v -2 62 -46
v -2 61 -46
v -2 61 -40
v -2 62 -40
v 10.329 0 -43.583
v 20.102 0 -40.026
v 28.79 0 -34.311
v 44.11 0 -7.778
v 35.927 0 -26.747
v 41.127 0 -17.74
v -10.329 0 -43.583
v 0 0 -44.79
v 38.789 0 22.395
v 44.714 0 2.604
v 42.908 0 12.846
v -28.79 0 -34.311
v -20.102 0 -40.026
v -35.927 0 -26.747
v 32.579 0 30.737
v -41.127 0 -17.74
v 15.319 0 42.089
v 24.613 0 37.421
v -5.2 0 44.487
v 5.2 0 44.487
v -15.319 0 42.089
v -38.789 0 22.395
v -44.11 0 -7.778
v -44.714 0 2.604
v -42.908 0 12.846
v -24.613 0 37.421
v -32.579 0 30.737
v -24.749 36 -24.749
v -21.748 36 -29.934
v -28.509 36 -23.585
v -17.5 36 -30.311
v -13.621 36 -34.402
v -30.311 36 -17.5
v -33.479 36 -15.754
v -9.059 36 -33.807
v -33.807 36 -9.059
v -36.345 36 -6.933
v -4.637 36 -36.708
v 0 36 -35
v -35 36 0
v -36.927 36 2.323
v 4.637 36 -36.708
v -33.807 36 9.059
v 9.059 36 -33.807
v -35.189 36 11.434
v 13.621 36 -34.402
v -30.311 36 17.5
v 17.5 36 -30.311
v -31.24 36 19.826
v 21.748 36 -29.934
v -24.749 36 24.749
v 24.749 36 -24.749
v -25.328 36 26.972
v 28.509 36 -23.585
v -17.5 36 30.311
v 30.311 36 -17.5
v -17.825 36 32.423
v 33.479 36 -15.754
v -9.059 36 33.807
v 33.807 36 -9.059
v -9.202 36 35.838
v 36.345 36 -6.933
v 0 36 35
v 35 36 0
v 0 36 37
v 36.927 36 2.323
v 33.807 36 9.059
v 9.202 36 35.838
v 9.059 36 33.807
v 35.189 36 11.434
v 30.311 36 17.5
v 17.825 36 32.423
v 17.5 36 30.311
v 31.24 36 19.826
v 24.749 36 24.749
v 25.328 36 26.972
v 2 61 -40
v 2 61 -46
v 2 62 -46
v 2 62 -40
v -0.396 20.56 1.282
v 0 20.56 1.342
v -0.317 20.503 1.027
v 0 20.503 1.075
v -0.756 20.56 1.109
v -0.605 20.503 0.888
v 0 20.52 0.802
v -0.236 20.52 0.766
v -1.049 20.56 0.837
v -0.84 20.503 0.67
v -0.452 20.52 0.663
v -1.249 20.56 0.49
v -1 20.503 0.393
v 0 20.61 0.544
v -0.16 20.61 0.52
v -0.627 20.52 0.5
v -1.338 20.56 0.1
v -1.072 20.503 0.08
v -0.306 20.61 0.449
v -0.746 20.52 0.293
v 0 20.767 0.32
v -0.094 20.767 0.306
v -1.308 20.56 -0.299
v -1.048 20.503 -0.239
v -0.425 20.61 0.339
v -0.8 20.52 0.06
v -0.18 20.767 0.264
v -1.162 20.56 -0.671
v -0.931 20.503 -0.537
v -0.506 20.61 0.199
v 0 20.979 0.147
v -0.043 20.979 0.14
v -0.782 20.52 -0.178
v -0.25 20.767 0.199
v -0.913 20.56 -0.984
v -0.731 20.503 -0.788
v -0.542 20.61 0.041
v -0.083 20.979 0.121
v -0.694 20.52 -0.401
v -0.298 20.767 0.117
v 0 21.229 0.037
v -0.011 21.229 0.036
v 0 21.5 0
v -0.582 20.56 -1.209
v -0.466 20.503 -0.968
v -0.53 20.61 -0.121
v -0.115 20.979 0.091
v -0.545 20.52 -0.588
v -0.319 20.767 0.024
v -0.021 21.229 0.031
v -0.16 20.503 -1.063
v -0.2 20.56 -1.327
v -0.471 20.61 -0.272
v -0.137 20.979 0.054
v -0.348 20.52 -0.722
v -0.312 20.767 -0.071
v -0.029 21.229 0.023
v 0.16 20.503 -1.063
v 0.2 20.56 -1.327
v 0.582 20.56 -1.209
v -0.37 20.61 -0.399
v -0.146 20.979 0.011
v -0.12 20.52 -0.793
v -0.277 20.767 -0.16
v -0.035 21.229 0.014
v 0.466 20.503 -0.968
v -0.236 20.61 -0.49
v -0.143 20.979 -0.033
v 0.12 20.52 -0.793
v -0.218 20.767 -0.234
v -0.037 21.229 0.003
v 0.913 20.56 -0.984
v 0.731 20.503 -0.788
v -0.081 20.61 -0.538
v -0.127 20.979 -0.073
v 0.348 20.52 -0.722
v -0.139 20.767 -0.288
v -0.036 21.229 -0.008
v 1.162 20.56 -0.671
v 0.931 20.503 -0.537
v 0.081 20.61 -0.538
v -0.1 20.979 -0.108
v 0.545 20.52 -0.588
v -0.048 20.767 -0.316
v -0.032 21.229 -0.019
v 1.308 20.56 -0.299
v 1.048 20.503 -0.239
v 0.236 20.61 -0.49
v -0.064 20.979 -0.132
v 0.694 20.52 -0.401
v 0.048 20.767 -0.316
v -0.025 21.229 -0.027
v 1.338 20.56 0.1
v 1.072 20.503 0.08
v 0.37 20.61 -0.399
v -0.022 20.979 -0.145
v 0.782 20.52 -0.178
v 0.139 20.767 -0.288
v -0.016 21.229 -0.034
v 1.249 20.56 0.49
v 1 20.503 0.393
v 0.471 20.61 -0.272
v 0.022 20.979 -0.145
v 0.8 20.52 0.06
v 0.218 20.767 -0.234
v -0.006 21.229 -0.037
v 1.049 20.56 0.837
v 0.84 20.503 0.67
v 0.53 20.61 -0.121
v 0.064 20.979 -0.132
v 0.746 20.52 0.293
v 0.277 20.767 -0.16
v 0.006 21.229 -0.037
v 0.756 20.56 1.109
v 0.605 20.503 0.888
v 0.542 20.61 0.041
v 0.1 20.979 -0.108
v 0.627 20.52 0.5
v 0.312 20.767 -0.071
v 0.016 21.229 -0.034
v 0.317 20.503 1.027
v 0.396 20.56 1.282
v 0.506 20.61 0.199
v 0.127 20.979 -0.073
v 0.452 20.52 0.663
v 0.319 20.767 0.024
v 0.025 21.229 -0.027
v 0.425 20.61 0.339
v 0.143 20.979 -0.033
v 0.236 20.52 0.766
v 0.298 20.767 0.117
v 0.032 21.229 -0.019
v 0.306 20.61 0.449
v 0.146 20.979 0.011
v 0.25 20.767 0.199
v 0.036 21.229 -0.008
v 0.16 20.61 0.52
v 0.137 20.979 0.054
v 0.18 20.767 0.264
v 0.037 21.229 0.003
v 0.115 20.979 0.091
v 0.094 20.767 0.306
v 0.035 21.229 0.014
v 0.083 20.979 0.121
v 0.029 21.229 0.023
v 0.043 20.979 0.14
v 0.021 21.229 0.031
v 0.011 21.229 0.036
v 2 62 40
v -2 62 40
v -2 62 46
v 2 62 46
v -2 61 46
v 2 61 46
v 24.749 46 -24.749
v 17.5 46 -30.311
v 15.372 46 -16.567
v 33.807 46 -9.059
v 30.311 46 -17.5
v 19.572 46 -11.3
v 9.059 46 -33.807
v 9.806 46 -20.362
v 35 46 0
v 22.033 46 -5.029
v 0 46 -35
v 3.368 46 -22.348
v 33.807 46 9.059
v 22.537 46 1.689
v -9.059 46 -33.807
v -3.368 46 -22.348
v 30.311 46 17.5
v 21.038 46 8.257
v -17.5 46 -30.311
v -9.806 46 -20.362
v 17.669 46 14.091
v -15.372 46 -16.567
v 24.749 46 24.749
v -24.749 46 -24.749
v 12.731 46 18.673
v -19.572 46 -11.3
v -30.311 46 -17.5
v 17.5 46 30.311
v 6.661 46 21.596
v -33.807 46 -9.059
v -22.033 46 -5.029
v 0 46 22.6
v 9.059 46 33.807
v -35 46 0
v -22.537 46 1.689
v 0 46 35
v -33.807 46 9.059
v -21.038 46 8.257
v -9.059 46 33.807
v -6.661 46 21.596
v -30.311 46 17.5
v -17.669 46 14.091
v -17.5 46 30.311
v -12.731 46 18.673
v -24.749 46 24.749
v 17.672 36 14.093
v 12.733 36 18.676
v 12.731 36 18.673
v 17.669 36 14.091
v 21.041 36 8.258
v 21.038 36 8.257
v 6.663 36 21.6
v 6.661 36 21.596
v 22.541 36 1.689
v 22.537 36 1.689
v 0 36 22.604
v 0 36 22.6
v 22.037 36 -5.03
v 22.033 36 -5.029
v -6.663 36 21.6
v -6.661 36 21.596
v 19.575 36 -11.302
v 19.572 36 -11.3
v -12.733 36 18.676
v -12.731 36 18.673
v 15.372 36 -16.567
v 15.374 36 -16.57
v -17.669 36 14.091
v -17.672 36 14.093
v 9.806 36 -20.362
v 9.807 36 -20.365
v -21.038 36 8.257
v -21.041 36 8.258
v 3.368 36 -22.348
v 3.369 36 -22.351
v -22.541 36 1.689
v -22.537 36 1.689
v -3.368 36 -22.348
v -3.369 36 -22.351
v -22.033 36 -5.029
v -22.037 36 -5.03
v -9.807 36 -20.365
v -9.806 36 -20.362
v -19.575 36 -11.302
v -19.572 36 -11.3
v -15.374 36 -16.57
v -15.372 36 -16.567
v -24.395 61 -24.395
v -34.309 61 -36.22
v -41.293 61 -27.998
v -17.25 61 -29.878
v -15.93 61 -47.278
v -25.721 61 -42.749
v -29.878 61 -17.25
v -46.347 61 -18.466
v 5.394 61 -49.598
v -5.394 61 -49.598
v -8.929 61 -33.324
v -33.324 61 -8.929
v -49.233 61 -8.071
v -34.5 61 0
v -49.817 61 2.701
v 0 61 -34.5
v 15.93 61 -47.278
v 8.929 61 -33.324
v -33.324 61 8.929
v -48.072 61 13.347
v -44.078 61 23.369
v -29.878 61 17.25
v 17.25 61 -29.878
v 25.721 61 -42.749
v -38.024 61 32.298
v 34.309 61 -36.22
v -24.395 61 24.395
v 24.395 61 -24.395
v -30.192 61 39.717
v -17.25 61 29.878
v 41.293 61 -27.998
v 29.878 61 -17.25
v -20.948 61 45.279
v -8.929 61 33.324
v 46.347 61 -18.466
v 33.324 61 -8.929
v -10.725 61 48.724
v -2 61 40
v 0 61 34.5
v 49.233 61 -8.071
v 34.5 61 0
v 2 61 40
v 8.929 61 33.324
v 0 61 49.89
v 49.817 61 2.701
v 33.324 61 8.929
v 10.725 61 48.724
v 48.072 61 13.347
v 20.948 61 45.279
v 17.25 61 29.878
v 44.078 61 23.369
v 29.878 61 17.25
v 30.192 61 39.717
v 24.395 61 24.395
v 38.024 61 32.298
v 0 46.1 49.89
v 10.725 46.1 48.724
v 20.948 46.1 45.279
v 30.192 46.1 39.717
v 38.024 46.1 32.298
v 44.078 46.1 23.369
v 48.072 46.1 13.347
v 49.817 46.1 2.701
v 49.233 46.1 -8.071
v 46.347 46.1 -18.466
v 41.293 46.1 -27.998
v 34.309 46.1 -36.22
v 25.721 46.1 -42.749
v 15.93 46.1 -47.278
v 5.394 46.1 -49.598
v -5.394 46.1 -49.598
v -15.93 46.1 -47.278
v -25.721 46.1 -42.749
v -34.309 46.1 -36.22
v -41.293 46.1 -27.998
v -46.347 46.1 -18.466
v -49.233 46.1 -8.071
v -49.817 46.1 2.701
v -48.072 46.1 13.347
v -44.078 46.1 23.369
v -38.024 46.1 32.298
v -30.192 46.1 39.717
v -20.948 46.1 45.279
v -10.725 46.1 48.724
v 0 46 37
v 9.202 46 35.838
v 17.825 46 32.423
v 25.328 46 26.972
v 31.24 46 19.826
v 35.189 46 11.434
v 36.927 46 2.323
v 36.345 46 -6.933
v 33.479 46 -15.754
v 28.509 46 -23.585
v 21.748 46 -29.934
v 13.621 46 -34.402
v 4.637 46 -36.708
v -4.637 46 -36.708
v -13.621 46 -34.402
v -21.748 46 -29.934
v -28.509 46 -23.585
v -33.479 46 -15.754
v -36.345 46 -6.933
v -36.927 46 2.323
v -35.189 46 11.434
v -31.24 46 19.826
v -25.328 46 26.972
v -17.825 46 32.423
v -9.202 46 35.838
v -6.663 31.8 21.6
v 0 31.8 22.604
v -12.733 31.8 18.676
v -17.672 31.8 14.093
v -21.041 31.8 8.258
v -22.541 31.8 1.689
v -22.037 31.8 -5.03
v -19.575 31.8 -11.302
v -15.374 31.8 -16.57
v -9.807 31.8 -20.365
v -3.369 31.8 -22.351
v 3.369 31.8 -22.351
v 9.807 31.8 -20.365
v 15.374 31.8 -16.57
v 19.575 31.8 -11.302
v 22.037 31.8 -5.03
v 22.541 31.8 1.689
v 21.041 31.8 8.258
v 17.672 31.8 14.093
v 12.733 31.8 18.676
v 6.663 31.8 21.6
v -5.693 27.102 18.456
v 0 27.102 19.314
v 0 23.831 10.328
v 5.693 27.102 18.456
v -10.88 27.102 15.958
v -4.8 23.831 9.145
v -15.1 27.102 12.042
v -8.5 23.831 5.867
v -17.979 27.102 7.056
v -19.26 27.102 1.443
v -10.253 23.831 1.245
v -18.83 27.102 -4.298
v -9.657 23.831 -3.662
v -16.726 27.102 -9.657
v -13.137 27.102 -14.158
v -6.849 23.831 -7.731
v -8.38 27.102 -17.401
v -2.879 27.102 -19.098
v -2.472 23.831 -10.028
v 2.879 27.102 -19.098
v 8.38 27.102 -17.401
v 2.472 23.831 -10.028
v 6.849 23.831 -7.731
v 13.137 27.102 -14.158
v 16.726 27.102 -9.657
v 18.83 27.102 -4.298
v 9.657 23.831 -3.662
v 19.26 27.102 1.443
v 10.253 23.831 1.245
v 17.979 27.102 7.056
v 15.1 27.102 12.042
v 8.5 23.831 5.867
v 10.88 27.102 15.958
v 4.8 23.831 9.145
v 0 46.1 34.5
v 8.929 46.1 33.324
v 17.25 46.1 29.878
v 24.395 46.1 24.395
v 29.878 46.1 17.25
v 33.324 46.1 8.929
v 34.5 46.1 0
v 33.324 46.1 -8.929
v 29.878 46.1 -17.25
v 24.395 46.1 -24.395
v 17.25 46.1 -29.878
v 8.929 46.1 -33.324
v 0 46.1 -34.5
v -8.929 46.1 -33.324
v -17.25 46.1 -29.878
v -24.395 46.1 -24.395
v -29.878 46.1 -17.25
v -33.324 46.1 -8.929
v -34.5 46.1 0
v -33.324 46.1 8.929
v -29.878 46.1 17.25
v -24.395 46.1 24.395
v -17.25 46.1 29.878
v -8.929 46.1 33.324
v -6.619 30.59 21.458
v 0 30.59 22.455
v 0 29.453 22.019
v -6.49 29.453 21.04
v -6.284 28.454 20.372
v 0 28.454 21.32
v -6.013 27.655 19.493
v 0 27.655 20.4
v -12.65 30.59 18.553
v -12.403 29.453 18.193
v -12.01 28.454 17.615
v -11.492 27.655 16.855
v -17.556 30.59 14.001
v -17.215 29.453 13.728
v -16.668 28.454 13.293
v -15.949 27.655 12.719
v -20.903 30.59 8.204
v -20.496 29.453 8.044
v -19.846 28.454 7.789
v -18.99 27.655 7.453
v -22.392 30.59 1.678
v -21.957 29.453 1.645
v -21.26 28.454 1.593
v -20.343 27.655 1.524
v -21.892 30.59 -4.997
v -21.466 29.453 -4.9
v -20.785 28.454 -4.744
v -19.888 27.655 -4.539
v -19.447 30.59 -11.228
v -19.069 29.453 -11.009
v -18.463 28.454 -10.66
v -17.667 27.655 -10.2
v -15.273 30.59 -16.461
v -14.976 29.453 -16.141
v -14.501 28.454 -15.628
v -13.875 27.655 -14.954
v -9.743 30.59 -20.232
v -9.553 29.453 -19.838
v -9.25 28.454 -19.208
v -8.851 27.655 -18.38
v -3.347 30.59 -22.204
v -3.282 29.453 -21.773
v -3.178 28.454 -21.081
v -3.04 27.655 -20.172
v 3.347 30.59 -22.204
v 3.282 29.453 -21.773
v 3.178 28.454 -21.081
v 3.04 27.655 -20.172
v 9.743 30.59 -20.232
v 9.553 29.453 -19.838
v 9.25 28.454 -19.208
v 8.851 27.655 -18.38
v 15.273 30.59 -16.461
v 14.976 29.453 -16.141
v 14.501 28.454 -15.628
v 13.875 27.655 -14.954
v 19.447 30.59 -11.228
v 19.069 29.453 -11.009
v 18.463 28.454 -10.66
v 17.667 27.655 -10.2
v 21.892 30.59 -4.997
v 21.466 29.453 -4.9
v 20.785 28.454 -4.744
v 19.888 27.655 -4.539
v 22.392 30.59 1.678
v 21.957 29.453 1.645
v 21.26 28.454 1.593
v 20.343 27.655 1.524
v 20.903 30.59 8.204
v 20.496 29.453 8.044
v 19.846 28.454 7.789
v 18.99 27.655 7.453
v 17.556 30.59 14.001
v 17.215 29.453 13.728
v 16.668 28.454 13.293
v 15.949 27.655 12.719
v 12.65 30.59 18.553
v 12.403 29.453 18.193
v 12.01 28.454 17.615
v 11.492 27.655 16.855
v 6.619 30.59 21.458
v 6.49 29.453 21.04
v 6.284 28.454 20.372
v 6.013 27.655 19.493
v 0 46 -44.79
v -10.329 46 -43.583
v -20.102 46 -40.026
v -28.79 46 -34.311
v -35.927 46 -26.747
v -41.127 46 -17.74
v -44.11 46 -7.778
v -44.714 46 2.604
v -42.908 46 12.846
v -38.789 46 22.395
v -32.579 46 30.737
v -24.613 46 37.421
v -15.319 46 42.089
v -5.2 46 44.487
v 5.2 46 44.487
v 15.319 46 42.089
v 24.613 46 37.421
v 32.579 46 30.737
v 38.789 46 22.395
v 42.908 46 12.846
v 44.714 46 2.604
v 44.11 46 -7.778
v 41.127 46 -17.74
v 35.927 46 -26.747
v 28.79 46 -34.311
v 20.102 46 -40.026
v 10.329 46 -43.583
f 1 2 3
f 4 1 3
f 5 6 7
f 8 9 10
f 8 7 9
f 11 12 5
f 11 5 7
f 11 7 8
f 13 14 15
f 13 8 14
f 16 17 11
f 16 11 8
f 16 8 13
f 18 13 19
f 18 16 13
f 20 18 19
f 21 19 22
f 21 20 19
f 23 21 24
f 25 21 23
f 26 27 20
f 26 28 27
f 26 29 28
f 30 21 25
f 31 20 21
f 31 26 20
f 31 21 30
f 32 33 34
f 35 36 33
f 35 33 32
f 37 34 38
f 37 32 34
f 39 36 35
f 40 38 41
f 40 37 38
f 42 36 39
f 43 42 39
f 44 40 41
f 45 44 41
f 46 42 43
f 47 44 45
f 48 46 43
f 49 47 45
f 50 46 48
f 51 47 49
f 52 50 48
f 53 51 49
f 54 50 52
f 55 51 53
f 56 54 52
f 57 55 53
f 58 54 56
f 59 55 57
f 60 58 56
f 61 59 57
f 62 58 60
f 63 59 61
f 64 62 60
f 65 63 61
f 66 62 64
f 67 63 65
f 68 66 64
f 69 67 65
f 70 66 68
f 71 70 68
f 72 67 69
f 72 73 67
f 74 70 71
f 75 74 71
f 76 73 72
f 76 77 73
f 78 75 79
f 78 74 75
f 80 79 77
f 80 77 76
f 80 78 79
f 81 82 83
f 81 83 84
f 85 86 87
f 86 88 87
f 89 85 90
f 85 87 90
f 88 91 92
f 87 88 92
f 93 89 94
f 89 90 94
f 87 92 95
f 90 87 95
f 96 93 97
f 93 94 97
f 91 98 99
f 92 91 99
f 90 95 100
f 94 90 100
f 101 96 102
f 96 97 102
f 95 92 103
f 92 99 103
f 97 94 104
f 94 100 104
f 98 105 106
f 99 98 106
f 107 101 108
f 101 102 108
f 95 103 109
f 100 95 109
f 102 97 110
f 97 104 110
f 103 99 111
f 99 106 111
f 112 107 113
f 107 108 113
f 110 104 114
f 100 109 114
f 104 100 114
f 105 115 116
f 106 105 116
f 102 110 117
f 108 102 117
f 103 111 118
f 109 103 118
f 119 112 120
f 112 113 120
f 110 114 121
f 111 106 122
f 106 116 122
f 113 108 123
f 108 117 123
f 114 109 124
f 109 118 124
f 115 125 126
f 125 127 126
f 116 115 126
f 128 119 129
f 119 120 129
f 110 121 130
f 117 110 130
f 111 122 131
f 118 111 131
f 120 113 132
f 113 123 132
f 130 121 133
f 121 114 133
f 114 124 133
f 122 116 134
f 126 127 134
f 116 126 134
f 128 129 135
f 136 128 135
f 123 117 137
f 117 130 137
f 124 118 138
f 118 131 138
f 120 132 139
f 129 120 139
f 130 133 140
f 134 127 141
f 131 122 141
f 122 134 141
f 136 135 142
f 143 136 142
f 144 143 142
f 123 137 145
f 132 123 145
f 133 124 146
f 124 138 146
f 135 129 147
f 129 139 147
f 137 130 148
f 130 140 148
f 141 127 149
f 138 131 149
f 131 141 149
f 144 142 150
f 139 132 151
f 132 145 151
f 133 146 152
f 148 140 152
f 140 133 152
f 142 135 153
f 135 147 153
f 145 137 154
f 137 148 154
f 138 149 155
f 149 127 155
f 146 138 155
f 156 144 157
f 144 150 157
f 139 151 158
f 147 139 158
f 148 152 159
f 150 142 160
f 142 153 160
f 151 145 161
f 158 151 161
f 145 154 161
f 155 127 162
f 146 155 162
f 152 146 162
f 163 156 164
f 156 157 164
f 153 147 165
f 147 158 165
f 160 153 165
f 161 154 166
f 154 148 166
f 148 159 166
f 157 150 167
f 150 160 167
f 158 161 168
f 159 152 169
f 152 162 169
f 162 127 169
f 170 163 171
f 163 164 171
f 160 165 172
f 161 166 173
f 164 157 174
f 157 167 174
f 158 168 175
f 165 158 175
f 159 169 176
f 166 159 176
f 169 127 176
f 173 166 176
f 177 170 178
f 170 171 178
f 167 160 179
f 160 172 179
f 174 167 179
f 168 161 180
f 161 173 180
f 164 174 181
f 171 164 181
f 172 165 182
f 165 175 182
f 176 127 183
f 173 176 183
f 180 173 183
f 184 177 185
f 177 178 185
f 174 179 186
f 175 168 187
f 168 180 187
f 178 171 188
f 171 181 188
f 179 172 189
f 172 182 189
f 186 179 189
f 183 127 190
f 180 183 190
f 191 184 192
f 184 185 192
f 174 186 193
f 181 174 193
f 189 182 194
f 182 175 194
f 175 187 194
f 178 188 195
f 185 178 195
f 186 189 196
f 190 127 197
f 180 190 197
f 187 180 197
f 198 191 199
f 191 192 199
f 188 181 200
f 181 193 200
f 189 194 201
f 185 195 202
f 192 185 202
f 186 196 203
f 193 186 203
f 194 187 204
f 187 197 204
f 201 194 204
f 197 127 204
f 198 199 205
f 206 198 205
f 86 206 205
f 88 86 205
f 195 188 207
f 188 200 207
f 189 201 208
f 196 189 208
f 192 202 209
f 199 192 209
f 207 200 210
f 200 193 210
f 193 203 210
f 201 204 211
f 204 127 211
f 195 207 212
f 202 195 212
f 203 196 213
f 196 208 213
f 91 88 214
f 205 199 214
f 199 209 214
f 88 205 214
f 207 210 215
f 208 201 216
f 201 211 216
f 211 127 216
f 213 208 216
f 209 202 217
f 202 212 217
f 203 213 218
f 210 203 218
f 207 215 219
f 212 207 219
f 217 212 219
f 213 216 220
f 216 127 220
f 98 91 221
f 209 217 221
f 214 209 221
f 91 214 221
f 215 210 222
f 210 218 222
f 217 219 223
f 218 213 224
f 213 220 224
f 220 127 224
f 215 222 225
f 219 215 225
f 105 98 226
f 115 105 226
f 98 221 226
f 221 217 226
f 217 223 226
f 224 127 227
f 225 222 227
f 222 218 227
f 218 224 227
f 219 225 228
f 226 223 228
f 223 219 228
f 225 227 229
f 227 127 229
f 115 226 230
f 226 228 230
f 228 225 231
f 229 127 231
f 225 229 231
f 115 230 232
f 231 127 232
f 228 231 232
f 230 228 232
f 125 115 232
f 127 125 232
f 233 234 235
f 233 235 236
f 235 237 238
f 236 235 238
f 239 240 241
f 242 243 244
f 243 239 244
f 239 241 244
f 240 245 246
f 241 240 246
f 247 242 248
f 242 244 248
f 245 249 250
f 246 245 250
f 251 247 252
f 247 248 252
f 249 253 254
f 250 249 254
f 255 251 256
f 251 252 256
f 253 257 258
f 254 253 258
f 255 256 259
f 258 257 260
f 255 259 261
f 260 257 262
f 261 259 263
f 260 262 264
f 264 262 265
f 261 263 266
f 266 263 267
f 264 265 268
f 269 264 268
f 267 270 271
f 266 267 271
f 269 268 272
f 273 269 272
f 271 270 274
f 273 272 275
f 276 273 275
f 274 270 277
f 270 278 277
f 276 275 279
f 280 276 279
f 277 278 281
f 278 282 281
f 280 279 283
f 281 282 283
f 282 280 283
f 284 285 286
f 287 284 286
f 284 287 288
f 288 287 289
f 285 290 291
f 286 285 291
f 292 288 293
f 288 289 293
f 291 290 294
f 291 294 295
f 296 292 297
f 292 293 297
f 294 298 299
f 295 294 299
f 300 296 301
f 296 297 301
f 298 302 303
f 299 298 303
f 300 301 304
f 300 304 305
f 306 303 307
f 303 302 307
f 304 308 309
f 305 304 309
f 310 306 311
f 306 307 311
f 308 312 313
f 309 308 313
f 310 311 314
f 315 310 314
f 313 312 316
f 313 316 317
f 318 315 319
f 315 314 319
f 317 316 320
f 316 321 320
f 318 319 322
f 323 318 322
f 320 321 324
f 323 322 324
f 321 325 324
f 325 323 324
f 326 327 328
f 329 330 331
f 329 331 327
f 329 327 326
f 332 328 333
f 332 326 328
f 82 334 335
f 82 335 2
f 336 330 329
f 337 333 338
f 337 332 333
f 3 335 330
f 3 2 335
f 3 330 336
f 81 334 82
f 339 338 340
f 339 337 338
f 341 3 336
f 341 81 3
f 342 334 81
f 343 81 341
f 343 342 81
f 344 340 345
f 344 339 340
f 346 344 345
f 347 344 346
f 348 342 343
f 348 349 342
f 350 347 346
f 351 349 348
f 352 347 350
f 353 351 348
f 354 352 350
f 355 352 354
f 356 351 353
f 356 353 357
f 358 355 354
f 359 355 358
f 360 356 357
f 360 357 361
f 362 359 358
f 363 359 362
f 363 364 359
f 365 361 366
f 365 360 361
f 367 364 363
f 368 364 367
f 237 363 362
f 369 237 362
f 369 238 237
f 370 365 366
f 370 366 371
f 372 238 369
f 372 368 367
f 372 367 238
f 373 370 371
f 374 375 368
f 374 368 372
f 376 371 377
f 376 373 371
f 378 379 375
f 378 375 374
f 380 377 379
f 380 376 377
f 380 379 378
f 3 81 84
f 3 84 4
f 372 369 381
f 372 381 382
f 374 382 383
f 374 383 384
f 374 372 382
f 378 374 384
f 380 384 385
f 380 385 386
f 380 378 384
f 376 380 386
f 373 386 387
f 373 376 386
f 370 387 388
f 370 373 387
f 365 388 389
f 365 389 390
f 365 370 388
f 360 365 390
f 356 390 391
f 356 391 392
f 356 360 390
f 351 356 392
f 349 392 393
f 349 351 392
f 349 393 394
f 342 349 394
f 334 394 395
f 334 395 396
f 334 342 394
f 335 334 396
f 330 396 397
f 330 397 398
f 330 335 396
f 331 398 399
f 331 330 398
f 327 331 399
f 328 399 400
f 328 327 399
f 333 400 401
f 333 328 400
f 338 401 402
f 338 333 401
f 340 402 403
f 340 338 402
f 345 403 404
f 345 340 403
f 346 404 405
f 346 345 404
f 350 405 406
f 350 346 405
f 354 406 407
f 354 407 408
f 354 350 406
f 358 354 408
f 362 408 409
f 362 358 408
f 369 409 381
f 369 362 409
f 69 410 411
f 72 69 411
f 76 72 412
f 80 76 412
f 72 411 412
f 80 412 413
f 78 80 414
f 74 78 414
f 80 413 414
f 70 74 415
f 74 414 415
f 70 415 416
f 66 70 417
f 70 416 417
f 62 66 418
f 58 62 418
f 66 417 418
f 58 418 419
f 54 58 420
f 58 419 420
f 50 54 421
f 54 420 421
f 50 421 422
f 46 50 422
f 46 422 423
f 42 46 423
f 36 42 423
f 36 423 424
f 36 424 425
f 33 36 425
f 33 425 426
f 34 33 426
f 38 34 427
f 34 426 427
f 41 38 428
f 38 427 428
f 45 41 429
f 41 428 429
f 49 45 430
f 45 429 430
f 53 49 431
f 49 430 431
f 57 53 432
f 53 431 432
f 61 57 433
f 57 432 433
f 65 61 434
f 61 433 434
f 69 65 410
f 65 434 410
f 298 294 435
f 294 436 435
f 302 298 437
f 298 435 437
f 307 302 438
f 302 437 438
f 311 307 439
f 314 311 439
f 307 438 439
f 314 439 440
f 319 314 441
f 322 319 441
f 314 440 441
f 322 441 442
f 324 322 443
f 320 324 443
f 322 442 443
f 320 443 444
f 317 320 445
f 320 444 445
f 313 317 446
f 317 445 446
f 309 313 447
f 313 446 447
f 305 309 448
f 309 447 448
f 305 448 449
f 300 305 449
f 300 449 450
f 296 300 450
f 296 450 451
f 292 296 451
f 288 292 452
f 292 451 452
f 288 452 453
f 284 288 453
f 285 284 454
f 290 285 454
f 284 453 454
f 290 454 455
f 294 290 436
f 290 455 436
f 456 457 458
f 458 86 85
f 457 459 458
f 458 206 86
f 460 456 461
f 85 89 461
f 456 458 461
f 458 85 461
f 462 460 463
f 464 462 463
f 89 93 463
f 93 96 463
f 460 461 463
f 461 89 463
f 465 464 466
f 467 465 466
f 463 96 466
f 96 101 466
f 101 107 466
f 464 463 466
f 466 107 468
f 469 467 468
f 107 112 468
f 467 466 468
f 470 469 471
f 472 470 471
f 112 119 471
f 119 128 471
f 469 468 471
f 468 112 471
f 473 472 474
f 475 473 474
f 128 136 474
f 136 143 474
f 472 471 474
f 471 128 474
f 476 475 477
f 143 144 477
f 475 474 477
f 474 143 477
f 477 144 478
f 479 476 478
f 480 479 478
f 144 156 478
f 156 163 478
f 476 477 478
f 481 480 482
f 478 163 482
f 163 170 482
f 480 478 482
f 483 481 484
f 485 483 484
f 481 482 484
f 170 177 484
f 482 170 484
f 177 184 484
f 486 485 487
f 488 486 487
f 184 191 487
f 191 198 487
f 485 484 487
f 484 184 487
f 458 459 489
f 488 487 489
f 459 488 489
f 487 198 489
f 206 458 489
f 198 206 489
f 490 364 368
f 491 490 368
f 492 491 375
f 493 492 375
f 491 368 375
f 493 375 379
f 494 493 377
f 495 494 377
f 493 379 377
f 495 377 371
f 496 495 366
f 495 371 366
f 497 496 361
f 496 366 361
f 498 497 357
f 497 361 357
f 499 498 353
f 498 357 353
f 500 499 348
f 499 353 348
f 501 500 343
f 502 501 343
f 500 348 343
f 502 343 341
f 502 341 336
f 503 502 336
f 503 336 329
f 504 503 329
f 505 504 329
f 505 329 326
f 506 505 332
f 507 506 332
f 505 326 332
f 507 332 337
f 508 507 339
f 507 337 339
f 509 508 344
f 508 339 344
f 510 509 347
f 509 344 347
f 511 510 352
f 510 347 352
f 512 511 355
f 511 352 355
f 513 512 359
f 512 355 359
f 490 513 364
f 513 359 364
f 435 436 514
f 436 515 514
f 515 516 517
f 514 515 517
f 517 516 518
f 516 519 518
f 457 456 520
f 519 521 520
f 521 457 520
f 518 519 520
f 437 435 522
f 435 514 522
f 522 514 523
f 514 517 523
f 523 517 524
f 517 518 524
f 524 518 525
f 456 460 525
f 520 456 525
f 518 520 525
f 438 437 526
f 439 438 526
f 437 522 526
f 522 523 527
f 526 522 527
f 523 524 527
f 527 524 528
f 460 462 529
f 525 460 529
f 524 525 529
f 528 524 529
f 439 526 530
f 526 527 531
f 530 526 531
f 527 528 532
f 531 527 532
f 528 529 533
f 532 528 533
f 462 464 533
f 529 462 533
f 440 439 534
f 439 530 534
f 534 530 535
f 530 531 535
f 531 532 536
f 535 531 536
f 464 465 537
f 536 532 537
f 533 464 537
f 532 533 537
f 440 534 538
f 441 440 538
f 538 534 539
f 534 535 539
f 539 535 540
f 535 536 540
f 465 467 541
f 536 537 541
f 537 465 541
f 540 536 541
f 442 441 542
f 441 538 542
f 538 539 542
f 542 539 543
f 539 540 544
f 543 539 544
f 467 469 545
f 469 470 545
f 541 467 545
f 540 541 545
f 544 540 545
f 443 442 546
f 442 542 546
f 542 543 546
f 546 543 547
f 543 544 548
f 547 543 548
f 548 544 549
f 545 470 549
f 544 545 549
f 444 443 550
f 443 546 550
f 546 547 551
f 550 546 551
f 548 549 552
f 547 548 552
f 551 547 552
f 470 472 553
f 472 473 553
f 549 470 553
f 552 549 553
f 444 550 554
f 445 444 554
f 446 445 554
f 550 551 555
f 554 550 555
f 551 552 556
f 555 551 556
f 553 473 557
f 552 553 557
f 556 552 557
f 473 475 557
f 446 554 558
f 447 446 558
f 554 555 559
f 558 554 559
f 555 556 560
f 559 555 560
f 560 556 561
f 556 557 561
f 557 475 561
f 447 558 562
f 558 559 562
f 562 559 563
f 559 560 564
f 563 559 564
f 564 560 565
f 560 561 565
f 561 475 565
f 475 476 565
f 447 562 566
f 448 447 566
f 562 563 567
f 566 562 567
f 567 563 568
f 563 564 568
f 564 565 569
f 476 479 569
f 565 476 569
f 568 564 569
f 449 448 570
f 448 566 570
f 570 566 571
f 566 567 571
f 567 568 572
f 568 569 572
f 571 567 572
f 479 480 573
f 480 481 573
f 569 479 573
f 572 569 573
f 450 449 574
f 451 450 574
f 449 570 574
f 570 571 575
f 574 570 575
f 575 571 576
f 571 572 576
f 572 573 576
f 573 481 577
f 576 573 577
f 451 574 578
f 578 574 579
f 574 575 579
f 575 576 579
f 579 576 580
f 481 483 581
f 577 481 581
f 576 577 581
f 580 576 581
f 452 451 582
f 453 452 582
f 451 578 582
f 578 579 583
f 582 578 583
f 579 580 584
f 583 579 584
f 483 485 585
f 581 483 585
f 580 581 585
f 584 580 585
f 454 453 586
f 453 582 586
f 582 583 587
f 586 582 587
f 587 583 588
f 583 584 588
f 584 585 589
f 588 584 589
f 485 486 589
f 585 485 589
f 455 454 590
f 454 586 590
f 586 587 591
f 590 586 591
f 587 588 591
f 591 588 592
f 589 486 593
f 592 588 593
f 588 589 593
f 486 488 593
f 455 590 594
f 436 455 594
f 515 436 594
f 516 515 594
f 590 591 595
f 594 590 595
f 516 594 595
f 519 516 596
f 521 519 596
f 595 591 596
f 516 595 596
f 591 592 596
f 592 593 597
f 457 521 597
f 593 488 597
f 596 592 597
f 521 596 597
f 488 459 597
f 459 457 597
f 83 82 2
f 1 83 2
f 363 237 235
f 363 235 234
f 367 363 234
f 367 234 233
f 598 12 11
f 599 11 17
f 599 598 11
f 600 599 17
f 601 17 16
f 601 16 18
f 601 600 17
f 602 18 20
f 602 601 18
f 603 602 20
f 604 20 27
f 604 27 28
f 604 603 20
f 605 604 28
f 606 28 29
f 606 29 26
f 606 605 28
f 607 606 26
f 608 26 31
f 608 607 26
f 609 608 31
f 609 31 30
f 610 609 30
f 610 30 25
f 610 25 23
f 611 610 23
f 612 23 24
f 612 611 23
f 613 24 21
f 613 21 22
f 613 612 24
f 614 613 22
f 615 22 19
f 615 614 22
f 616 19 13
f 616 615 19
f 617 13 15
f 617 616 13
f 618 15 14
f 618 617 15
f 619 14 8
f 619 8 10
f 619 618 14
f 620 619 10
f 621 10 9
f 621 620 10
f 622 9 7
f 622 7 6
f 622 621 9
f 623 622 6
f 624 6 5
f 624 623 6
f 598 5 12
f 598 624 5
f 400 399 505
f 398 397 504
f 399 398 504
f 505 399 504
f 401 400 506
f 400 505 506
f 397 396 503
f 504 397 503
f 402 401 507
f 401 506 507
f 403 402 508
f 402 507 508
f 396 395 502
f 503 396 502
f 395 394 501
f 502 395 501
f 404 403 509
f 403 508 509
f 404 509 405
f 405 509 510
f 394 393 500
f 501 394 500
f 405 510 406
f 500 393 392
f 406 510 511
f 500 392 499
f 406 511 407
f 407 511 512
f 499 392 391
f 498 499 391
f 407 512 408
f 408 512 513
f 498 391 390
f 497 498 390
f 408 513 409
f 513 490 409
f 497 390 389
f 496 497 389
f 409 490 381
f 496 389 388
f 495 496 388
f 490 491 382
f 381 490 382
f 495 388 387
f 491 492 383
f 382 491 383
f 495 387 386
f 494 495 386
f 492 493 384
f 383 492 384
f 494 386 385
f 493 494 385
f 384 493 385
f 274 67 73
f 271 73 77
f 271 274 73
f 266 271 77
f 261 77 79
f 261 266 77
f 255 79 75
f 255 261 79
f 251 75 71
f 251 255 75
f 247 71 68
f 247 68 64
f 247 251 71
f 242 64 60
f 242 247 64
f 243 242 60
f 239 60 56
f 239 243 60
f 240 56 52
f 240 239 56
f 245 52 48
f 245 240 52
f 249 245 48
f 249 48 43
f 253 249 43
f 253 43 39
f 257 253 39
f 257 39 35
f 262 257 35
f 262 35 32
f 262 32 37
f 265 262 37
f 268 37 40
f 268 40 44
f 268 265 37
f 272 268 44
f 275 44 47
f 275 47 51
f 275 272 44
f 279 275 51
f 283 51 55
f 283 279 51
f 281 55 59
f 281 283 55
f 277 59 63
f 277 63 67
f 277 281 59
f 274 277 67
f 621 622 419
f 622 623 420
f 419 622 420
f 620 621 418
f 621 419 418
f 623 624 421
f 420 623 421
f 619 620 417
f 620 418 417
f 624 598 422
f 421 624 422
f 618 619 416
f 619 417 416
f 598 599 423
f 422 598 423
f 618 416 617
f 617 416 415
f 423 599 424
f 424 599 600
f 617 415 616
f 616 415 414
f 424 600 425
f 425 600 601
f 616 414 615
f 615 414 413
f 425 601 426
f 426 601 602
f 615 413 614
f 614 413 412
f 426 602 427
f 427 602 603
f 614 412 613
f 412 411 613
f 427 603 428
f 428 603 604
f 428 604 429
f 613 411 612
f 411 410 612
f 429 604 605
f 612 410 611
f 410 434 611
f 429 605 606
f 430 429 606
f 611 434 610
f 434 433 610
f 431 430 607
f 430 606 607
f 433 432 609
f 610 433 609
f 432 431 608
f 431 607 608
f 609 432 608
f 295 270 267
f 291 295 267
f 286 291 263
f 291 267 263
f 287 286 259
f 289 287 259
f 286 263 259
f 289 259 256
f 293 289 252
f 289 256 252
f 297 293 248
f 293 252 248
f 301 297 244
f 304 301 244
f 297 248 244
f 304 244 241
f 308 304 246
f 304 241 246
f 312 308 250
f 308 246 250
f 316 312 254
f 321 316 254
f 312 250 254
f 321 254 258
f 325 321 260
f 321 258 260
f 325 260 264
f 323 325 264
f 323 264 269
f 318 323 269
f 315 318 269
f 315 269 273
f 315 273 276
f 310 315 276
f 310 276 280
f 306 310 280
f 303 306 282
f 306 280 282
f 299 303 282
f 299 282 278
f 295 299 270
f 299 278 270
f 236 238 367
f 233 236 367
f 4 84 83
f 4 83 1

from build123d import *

# Parameters (mm, degrees)
SKETCH3_W           = 44.79
SKETCH3_H           = 46
SKETCH4_R           = 22.6
CUT_EXTRUDE1_DEPTH  = 10
SKETCH5_R           = 37
SKETCH5_R_2         = 35
CUT_EXTRUDE3_DEPTH  = 10
SKETCH6_R           = 49.89
SKETCH6_R_2         = 34.5
BOSS_EXTRUDE2_DEPTH = 14.9
SKETCH15_W          = 4
SKETCH15_H          = 6
BOSS_EXTRUDE4_DEPTH = 1
CIRPATTERN2_COUNT   = 2


with BuildPart() as part:
    # Sketch3 → Revolve1 (revolve)
    with BuildSketch(Plane.XY, mode=Mode.PRIVATE) as revolve1_sk:
        with Locations((22.395, 23)):
            Rectangle(SKETCH3_W, SKETCH3_H)
    revolve(revolve1_sk.sketch.rotate(Axis((0, -20, 0), (0, 1, 0)), 90), axis=Axis((0, -20, 0), (0, 1, 0)))

    # Sketch4 → Cut-Extrude1 (cut)
    with BuildSketch(Plane(origin=(0, 46, 0), x_dir=(1, 0, 0), z_dir=(0, 1, 0))):
        with Locations(Location((0, 0, 0), (0, 0, 270))):
            Circle(SKETCH4_R)
    extrude(amount=-CUT_EXTRUDE1_DEPTH, mode=Mode.SUBTRACT)

    # Sketch5 → Cut-Extrude3 (cut)
    with BuildSketch(Plane(origin=(0, 46, 0), x_dir=(1, 0, 0), z_dir=(0, 1, 0))):
        with Locations(Location((0, 0, 0), (0, 0, 270))):
            Circle(SKETCH5_R)
        with Locations(Location((0, 0, 0), (0, 0, 270))):
            Circle(SKETCH5_R_2, mode=Mode.SUBTRACT)
    extrude(amount=-CUT_EXTRUDE3_DEPTH, mode=Mode.SUBTRACT)

    # Sketch13 → Cut-Revolve1 (revolve, cut)
    with BuildSketch(Plane.XY, mode=Mode.PRIVATE) as cut_revolve1_sk:
        with BuildLine():
            Line((0, 36), (-22.60379982, 36))
            Line((-22.60379982, 36), (-22.60379982, 31.8))
            ThreePointArc((-22.60379982, 31.8), (-21.699560041, 28.932117818), (-19.313900536, 27.101536896))
            Line((-19.313900536, 27.101536896), (-1.342020143, 20.560307379))
            ThreePointArc((-1.342020143, 20.560307379), (-0.426423564, 20.680847956), (0, 21.5))
            Line((0, 21.5), (0, 36))
        make_face()
    revolve(cut_revolve1_sk.sketch.rotate(Axis((0, 42.388918631, 0), (0, -1, 0)), 270), axis=Axis((0, 42.388918631, 0), (0, -1, 0)), mode=Mode.SUBTRACT)


with BuildPart() as body_2:
    # Sketch6 → Boss-Extrude2 (new body)
    with BuildSketch(Plane(origin=(0, 61, 0), x_dir=(1, 0, 0), z_dir=(0, 1, 0))):
        with Locations(Location((0, 0, 0), (0, 0, 270))):
            Circle(SKETCH6_R)
        with Locations(Location((0, 0, 0), (0, 0, 270))):
            Circle(SKETCH6_R_2, mode=Mode.SUBTRACT)
    extrude(amount=-BOSS_EXTRUDE2_DEPTH)

    # Sketch15 → Boss-Extrude4 (add)
    with BuildSketch(Plane(origin=(0, 61, 0), x_dir=(1, 0, 0), z_dir=(0, 1, 0))):
        with Locations((0, -43)):
            Rectangle(SKETCH15_W, SKETCH15_H)
    boss_extrude4 = extrude(amount=BOSS_EXTRUDE4_DEPTH)

    # CirPattern2: Boss-Extrude4 ×2 about axis
    cirpattern2_axis = Axis((0, 0, 0), (0, 1, 0))
    for i in range(1, CIRPATTERN2_COUNT):
        add(boss_extrude4.rotate(cirpattern2_axis, i * 360 / CIRPATTERN2_COUNT))


solid = Compound([part.part, body_2.part])
